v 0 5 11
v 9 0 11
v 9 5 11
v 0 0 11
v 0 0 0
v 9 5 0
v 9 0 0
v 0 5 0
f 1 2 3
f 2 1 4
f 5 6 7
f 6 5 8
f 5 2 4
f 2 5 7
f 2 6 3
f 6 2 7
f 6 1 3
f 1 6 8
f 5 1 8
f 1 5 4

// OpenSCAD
// Generated by SolidPython 1.0.1 on 2020-07-29 00:46:55


cube(size = [9, 5, 11]);
/***********************************************
*********      SolidPython code:      **********
************************************************
 
# import packages: SolidPython
from solid import *
from solid.utils import *
from itertools import chain, combinations, permutations


class Resize:

    def __init__(self, scad_file):
        self.scad_file = scad_file
        #self.scad_file = import_scad(scad_file)
        # cone/cylinder param:
        self.r1 = 0
        self.r2 = 0
        self.h = 0
        # rectangular prism param:
        self.w = 0
        self.l = 0
        # ellipse param:
        self.r = 0

    # import OpenScad code (file name corresponds to shape)


    # classify shape + parameters
    def assign(self, param1, param2, param3):
        if self.scad_file == 'cone.scad':
            self.r1 = param1
            self.r2 = param2
            self.h = param3
        elif self.scad_file == 'cylinder.scad':
            self.r1 = param1
            self.r2 = param2
            self.h = param3
        elif self.scad_file == 'rectangularPrism.scad':
            self.h = param1
            self.l = param2
            self.w = param3
        else:
            self.r = param1
            self.h = param2

    # resize parameters
    def iterate(self):
        x = range(3, 20, 2)
        i = 1
        if self.scad_file == 'cone.scad':
            tempList = list(permutations(x, 2))
            for temp in tempList:
                param1 = temp[0]
                param2 = temp[1]
                filepath = 'produced_scad_files/' + 'cone' + str(param1) + '_' + str(param2) + '_' + '.scad'
                scad_render_to_file(cylinder(h=param1, r1=param2, r2=0), filepath)

        elif self.scad_file == 'cylinder.scad':
            tempList = list(permutations(x, 3))
            for temp in tempList:
                param1 = temp[0]
                param2 = temp[1]
                filepath = 'produced_scad_files/' + 'cylinder' + str(param1) + '_' + str(param2) + '_' + '.scad'
                scad_render_to_file(cylinder(h=param1, r1=param2, r2=param2), filepath)

        elif self.scad_file == 'rectangularPrism.scad':
            tempList = list(permutations(x, 3))
            for temp in tempList:
                param1 = temp[0]
                param2 = temp[1]
                param3 = temp[2]
                filepath = 'produced_scad_files/' + 'rectangularPrism' + str(param1) + '_' + str(param2) + '_' + str(
                    param3) + '.scad'
                scad_render_to_file(cube(size=(param1, param2, param3)), filepath)

        elif self.scad_file == 'ellipse.scad':
            tempList = list(permutations(x, 4))
            for temp in tempList:
                param1 = temp[0]
                param2 = temp[1]
                param3 = temp[2]
                param4 = temp[3]
                filepath = 'produced_scad_files/' + 'ellipse' + str(param1) + '_' + str(param2) + '_' + str(param3) + '_' + str(param4) + '.scad'
                scad_render_to_file(scale([param1, param2, param3])(sphere(r=param4)), filepath)

    def render_to_scadfile(self):
        scad_render_to_file(scad, 'example.scad') 
 
************************************************/
